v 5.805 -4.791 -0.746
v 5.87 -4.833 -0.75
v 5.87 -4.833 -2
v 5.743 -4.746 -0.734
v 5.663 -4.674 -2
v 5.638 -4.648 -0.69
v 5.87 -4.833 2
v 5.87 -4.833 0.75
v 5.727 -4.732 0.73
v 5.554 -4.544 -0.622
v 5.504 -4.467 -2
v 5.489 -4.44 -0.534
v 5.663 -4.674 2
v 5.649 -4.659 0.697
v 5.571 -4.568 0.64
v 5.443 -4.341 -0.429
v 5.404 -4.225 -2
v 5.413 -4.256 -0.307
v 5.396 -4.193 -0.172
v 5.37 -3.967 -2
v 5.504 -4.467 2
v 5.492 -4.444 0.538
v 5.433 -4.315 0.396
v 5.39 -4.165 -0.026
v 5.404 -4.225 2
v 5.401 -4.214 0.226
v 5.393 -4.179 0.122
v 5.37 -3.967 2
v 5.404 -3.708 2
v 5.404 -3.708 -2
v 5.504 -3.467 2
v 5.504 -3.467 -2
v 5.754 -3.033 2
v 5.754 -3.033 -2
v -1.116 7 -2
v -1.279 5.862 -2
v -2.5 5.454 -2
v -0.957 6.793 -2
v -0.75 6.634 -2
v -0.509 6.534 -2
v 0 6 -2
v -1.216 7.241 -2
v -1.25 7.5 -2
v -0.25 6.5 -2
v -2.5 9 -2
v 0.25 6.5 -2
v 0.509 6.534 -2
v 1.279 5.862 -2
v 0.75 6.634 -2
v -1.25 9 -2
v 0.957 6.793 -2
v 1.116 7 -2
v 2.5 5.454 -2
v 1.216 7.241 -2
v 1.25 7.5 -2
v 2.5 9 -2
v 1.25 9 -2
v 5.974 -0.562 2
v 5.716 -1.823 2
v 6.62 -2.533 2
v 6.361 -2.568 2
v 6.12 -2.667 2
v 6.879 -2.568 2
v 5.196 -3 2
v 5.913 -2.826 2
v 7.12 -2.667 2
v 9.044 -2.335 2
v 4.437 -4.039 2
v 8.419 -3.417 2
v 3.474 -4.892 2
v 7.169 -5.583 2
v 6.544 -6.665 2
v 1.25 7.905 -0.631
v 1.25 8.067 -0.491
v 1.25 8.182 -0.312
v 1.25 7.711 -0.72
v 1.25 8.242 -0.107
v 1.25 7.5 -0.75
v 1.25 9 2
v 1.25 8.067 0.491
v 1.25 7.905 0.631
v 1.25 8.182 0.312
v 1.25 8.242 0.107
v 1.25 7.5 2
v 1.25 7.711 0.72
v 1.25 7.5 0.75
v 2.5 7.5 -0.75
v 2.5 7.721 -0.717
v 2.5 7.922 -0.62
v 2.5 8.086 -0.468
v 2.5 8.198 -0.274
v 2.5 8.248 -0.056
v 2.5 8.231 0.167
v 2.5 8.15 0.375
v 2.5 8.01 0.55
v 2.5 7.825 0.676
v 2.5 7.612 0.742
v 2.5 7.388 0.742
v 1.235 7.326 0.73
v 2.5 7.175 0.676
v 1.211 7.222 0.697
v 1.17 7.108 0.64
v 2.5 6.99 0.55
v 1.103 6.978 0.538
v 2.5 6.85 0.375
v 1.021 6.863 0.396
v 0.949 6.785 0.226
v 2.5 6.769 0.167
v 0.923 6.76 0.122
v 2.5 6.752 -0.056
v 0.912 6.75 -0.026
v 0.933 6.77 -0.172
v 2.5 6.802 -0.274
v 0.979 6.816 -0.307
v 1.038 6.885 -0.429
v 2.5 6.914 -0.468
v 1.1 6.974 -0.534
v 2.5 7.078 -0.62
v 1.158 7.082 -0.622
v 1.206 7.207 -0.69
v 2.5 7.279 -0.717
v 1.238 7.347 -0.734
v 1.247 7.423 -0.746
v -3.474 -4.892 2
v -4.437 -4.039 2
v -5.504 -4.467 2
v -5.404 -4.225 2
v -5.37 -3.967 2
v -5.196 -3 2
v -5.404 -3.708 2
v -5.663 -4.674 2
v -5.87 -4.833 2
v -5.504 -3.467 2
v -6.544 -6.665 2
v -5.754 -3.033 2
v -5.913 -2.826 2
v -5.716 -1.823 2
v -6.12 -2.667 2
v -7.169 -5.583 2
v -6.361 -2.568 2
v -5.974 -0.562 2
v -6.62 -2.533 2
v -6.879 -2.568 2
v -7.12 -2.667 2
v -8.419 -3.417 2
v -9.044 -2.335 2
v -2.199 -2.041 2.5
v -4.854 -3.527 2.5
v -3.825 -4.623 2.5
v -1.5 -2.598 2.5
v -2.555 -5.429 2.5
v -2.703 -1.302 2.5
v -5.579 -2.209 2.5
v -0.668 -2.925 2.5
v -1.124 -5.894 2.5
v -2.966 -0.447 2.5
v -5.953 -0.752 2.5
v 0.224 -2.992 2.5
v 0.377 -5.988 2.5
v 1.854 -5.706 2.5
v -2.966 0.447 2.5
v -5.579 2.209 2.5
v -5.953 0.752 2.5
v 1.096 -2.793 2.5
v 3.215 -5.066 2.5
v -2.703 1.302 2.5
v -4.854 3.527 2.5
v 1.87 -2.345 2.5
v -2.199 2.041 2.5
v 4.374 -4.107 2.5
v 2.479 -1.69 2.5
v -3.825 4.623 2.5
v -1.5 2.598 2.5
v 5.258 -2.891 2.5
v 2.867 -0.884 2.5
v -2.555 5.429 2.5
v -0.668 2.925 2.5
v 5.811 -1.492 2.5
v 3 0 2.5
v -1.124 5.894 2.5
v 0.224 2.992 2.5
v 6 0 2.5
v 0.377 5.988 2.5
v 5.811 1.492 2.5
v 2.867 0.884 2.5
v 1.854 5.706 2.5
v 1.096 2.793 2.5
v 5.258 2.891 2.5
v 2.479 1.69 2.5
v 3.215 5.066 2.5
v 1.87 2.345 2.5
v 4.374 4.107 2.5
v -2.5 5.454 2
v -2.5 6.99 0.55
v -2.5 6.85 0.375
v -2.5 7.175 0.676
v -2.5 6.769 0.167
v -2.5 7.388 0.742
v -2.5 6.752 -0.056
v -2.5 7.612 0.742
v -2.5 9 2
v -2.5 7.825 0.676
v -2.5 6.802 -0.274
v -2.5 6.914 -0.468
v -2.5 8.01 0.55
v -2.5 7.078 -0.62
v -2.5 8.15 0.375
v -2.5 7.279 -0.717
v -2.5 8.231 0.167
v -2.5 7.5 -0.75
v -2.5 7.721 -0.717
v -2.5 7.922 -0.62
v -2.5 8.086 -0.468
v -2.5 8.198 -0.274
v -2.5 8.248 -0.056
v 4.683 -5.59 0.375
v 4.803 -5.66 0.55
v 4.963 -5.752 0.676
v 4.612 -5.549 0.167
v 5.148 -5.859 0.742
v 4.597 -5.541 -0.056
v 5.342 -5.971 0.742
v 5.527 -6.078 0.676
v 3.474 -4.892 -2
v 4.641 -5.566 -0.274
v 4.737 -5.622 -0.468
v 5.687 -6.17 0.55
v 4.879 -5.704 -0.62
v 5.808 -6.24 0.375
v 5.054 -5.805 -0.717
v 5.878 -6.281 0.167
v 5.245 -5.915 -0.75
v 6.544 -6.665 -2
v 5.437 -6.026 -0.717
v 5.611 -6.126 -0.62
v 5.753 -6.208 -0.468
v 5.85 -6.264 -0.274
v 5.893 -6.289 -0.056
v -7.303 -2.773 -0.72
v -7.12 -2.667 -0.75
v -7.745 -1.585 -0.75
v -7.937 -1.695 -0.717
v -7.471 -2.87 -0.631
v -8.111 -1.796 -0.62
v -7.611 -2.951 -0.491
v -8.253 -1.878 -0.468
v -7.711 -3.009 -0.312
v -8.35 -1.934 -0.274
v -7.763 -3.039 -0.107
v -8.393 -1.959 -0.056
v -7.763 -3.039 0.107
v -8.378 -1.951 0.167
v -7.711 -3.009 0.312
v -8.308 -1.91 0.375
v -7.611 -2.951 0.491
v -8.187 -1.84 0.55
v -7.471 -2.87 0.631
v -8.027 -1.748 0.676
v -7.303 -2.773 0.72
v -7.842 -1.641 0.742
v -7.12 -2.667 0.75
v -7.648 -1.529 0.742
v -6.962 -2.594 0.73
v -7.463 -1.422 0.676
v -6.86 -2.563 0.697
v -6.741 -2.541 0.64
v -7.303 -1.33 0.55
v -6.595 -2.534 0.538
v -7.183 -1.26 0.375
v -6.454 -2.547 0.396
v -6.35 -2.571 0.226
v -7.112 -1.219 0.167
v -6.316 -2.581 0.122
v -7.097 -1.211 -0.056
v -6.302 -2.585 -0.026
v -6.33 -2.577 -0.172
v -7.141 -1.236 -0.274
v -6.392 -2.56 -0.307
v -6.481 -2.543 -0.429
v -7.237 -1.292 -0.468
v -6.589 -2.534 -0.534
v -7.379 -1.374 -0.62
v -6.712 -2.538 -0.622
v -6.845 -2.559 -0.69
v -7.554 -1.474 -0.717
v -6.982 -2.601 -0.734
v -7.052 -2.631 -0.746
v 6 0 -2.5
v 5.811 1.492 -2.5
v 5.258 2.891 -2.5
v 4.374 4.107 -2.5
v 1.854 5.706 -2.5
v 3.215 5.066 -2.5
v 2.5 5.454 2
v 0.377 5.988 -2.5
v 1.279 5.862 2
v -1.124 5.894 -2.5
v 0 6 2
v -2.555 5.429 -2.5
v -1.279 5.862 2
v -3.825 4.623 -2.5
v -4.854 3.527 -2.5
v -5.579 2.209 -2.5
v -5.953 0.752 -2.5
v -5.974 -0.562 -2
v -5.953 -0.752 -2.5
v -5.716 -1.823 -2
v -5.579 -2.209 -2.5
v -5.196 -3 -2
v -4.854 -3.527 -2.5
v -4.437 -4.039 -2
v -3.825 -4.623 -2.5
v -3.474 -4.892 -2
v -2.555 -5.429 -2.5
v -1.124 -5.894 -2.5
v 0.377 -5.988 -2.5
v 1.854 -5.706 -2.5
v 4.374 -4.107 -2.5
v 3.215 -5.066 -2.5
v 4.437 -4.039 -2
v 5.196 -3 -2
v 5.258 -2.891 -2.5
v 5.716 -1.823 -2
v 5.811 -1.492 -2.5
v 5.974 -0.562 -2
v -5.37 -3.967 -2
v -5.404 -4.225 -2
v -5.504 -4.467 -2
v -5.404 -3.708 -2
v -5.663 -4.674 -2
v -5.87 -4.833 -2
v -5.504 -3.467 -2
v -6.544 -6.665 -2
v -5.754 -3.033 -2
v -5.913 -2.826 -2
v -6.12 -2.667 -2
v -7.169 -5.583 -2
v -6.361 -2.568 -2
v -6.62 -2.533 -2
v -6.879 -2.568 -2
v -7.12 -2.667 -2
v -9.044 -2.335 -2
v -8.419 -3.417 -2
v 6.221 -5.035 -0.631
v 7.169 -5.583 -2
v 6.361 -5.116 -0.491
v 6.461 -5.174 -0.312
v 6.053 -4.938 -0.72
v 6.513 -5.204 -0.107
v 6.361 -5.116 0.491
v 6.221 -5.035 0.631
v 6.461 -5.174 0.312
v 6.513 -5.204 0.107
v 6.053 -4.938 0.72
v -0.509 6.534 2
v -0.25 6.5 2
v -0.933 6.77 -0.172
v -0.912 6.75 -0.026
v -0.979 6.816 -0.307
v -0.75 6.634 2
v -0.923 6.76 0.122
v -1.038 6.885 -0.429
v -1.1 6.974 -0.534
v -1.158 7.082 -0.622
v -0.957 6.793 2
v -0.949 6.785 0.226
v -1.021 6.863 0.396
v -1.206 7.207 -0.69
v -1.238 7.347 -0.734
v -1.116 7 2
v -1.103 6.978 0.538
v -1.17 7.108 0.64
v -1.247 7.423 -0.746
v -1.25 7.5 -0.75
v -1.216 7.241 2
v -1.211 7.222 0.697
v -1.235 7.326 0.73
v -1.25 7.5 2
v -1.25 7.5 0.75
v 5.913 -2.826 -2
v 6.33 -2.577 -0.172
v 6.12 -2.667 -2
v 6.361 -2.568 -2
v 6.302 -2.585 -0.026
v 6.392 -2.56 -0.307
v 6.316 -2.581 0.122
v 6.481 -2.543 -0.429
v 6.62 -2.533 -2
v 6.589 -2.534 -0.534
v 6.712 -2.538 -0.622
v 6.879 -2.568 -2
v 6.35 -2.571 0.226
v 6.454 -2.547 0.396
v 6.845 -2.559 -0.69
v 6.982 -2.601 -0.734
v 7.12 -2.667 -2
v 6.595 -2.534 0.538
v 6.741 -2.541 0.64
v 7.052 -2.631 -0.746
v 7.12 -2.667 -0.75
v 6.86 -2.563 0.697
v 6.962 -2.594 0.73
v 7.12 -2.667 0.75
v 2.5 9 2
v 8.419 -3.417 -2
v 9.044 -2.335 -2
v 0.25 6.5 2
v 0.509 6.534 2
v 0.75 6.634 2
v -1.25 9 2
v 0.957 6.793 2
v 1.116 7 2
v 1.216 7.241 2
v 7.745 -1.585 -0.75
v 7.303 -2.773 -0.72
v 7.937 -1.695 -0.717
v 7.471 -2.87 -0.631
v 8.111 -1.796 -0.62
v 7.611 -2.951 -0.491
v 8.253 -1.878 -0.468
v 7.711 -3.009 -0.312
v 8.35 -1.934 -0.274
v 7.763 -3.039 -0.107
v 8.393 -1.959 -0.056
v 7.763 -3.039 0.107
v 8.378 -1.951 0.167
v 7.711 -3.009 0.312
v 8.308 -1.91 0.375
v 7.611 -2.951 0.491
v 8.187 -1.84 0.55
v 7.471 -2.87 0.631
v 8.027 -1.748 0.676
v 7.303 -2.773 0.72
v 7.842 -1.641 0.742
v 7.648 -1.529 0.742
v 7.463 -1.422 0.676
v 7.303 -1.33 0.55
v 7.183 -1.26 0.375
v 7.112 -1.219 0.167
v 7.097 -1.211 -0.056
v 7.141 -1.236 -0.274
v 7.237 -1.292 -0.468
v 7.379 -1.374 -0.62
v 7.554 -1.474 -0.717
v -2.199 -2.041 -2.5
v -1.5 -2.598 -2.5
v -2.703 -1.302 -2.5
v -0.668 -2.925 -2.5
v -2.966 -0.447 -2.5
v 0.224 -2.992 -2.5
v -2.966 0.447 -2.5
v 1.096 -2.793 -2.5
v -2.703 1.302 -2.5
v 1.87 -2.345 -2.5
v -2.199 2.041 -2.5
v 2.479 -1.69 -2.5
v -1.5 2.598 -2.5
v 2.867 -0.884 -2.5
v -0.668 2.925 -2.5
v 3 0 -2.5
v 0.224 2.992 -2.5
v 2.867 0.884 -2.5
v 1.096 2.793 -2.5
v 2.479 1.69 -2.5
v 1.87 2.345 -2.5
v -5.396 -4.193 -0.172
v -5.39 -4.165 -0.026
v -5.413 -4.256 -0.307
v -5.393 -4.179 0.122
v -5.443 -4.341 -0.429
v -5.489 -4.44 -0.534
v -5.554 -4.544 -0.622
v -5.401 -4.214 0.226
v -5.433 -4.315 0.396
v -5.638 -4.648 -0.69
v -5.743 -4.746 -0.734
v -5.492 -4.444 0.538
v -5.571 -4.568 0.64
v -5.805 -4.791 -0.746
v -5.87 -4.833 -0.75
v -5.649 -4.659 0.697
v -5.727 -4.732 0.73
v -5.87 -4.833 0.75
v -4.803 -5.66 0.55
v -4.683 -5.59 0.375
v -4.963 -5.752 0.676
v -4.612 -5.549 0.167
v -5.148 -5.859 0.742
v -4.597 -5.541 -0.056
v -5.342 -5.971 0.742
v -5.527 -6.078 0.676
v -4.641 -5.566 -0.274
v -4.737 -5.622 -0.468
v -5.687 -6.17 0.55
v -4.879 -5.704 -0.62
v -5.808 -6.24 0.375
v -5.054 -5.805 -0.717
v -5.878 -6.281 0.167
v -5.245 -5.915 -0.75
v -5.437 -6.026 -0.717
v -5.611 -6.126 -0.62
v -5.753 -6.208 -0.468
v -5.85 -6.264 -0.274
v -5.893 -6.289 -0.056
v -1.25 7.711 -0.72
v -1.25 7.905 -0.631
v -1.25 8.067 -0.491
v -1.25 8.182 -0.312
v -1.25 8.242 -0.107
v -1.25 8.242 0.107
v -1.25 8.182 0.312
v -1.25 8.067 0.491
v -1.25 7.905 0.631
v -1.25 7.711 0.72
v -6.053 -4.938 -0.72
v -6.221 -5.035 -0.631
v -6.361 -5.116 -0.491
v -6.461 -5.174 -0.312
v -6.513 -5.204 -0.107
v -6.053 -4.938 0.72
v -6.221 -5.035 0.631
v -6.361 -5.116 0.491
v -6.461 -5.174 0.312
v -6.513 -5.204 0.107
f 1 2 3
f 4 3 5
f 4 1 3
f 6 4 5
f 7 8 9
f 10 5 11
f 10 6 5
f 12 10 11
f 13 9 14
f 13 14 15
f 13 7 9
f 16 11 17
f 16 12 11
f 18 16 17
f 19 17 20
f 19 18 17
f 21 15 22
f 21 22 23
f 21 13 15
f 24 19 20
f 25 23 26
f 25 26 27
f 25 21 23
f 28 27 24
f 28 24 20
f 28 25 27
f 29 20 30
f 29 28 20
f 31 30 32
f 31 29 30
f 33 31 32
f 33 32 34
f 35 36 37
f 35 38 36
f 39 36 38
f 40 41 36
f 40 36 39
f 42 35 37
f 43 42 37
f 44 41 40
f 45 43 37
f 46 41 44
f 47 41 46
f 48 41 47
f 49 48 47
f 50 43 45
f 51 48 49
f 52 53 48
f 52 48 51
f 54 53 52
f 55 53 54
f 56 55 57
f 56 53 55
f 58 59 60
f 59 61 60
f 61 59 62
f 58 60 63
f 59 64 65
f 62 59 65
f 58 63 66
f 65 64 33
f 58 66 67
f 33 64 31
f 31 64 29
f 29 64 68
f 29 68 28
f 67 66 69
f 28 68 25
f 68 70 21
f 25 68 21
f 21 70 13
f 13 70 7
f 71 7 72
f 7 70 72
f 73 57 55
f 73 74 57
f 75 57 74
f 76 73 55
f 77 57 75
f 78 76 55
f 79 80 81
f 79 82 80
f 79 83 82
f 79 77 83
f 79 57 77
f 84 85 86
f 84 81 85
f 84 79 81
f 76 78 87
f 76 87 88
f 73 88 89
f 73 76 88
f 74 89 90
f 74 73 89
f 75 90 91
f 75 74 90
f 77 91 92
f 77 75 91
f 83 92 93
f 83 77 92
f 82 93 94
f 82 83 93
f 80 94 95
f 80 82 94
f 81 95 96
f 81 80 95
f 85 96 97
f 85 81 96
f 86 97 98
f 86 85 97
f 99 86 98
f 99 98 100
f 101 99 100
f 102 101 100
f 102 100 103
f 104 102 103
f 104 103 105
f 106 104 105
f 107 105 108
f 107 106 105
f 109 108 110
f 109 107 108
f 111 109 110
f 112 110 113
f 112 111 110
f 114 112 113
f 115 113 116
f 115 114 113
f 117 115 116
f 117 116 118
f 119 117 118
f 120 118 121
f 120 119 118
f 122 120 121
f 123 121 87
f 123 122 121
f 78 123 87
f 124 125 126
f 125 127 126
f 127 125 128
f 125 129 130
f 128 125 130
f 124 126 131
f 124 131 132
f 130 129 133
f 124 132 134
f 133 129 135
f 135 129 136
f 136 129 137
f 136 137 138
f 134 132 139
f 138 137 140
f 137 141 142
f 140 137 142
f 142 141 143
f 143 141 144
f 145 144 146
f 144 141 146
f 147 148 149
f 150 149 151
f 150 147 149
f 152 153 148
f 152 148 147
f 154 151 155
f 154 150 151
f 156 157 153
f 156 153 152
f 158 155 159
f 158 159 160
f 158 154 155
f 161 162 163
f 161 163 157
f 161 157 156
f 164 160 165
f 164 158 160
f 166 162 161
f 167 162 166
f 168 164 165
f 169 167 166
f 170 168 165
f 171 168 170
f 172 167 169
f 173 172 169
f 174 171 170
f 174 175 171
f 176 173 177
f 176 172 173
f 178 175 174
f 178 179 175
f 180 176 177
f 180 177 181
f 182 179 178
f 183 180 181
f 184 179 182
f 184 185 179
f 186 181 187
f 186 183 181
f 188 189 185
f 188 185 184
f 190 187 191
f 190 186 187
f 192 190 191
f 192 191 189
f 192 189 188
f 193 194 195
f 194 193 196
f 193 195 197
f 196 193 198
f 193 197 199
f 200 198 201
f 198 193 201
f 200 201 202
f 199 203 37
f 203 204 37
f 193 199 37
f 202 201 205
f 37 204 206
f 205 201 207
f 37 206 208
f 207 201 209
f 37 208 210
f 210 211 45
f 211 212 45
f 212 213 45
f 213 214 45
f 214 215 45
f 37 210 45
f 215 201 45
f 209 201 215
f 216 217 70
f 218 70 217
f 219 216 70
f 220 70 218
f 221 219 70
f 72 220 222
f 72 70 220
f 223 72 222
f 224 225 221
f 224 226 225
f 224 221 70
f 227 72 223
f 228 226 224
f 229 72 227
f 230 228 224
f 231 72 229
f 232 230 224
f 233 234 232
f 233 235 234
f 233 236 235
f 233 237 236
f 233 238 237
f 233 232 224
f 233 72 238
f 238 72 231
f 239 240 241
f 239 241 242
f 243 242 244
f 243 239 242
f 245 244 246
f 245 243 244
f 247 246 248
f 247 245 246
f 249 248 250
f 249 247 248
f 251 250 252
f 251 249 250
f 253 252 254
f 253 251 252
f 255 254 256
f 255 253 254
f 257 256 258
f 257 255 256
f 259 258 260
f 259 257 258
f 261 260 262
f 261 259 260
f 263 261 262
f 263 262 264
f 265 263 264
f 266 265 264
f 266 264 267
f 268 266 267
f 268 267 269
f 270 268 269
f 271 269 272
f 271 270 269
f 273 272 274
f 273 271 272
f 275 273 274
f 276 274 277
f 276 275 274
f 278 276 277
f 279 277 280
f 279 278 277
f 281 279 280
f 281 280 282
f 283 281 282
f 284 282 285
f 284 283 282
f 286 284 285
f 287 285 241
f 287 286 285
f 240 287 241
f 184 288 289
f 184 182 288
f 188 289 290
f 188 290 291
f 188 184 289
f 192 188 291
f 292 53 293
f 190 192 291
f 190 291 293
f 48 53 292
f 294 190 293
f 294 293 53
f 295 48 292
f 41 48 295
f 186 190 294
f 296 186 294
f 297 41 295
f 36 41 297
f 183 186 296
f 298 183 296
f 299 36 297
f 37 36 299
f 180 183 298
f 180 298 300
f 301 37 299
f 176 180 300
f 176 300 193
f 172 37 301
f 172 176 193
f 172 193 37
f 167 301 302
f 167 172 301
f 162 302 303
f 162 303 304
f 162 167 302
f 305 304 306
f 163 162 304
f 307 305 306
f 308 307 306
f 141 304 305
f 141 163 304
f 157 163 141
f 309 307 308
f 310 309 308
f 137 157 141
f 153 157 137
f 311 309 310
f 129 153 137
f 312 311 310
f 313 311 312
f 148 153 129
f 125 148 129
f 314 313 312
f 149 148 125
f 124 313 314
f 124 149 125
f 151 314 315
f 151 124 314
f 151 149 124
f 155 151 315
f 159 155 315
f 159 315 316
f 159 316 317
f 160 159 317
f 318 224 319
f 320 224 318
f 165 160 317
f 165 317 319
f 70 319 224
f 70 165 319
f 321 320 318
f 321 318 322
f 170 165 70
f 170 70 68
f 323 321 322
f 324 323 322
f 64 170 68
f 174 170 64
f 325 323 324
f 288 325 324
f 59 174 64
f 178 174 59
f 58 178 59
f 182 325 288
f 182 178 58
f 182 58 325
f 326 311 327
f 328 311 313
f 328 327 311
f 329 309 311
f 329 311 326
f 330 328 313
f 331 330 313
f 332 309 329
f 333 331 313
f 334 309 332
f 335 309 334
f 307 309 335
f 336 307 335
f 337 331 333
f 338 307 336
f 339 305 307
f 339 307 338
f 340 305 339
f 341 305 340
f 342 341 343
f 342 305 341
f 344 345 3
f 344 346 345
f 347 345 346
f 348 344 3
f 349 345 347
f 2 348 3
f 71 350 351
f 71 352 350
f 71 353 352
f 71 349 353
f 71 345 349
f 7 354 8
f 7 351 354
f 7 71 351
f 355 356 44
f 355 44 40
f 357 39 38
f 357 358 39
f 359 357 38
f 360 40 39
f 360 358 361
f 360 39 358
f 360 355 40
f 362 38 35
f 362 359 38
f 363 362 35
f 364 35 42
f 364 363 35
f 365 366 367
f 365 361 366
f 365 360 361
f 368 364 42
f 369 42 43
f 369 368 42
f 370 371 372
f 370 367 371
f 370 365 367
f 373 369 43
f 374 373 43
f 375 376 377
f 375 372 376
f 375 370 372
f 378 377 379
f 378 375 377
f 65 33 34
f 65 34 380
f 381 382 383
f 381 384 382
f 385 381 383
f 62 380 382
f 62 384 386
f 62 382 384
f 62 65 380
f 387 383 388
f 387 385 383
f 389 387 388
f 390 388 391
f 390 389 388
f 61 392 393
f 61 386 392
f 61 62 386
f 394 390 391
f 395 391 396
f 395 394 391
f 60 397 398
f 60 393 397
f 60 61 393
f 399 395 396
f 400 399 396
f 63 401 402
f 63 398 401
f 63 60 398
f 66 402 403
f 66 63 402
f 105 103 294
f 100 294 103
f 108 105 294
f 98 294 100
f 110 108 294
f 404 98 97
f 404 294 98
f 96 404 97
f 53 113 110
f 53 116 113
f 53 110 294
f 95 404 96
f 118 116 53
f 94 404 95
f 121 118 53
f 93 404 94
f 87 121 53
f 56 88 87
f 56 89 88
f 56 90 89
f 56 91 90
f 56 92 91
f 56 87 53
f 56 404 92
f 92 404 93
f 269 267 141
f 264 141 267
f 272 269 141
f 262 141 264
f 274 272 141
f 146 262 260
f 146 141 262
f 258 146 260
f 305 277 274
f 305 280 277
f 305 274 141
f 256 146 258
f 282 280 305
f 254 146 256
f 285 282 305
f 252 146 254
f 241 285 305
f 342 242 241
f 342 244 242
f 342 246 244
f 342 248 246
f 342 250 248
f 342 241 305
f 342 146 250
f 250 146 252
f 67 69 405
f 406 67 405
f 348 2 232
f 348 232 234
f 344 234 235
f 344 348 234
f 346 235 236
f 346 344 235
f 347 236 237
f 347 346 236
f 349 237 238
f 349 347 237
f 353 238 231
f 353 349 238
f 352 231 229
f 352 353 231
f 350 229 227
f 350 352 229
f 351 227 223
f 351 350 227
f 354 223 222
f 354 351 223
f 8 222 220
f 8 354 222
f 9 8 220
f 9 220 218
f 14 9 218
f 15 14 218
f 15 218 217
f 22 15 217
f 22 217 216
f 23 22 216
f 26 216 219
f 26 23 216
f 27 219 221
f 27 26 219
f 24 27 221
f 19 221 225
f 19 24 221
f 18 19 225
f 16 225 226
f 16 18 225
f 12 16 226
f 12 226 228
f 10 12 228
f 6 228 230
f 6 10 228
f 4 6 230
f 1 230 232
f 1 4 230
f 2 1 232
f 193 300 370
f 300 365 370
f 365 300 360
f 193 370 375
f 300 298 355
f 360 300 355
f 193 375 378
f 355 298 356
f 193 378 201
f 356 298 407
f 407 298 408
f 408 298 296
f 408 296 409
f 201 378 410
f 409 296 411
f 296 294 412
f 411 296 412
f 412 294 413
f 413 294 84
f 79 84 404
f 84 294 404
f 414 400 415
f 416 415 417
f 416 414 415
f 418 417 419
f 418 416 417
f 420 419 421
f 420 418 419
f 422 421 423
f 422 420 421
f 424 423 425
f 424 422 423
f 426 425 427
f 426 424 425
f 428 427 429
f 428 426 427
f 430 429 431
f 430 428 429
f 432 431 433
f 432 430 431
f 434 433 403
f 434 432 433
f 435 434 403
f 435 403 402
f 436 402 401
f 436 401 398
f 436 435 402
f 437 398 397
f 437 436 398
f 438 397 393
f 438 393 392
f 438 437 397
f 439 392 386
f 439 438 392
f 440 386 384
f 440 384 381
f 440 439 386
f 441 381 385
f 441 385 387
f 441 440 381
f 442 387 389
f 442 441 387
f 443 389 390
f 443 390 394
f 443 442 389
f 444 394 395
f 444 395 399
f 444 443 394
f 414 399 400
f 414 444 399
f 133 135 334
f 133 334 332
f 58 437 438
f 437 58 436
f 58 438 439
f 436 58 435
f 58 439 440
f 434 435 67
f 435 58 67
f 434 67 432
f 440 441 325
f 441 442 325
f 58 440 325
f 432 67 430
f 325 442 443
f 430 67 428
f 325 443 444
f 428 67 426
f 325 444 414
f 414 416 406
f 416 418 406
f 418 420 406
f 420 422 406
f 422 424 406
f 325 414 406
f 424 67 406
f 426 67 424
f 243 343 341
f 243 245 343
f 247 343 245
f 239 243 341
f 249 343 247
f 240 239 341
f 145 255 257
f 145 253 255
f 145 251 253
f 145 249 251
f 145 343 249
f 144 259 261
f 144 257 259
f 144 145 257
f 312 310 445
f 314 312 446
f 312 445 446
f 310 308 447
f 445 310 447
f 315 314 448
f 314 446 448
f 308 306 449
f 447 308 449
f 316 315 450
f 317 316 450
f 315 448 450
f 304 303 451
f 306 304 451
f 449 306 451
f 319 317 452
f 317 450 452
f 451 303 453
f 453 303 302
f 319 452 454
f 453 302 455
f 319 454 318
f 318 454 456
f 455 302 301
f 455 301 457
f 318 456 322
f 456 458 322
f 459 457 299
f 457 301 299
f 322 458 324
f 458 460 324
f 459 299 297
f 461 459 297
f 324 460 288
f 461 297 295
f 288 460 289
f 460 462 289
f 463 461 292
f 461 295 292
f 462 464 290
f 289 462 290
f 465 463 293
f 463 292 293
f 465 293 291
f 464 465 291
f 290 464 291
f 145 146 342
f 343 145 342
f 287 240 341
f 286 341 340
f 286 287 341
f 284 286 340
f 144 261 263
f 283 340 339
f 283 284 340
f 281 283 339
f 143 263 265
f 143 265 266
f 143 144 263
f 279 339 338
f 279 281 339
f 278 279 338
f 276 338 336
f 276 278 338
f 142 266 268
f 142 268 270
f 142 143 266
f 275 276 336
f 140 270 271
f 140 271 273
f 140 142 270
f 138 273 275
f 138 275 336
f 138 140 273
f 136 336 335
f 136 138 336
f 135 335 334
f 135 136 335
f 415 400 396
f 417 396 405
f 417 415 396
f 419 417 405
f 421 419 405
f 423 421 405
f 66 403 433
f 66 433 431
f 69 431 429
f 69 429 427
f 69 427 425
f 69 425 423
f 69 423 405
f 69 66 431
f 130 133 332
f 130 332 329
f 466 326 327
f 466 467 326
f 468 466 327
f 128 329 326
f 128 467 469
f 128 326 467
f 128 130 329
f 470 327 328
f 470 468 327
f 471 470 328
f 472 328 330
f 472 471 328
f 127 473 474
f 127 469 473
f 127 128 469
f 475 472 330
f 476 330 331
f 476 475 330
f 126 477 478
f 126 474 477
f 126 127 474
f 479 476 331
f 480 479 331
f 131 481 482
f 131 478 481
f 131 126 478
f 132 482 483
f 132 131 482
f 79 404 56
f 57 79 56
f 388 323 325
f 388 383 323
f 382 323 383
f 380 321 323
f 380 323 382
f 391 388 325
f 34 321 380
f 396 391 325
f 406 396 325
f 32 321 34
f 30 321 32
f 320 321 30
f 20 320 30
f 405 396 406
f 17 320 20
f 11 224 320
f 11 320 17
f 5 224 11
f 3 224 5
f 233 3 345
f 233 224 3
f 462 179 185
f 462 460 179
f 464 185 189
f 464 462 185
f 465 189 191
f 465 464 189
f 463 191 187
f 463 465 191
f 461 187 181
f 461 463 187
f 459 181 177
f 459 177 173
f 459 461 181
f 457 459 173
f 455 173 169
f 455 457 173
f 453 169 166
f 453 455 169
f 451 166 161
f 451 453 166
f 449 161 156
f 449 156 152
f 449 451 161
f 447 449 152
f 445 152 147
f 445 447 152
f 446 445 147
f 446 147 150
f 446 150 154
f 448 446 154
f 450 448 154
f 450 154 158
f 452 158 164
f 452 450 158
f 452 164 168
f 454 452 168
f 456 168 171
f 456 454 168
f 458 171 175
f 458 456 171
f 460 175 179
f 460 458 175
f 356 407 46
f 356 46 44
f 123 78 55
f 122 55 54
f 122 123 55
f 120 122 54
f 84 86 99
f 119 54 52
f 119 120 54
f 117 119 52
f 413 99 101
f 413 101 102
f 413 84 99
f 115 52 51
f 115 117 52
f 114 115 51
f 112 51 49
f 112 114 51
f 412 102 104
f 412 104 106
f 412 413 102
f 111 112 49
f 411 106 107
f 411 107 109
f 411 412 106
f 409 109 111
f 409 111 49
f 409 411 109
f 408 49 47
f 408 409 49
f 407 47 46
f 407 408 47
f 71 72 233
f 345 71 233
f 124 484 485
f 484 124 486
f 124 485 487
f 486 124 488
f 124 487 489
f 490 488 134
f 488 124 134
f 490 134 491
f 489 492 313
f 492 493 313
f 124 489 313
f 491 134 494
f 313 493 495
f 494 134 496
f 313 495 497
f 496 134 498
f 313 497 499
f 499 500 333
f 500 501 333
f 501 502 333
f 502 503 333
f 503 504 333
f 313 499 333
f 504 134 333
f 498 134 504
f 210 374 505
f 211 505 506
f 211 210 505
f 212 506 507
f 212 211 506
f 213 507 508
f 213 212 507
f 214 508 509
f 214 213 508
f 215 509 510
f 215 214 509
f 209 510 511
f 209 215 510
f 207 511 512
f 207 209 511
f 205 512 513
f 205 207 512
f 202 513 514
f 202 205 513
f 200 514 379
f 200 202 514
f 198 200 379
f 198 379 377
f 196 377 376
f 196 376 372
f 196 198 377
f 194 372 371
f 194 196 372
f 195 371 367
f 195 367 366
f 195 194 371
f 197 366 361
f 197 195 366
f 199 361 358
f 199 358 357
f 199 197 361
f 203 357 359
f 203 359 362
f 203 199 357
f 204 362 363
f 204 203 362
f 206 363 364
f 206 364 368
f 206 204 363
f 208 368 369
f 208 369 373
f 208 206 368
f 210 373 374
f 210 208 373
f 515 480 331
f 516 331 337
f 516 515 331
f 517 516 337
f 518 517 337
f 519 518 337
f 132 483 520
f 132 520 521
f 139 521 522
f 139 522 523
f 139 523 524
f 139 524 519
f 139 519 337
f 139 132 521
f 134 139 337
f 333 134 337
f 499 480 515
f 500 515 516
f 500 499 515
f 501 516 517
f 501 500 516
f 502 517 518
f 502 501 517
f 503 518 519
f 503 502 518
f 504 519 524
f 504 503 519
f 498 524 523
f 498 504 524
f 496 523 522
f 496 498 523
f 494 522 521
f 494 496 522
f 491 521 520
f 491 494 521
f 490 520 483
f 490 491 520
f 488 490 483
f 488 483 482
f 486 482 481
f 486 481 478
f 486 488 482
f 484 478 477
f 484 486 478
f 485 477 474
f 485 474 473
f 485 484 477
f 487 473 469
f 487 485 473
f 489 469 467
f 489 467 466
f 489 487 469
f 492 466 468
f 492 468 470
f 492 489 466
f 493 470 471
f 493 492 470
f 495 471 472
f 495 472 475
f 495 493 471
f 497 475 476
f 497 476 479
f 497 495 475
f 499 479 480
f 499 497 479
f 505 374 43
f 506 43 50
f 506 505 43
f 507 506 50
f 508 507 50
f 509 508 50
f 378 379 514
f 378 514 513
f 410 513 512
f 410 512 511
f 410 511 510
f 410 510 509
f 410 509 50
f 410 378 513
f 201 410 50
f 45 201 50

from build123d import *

# Parameters (mm, degrees)
CROQUIS1_R              = 6
CROQUIS1_R_2            = 3
SALIENTE_EXTRUIR1_DEPTH = 2.5
CROQUIS3_W              = 4
CROQUIS3_H              = 4
CROQUIS3_R              = 0.75
SALIENTE_EXTRUIR2_DEPTH = 2.5
CORTAR_EXTRUIR1_DEPTH   = 5
MATRIZC1_COUNT          = 3


with BuildPart() as part:
    # Croquis1 → Saliente-Extruir1 (new, symmetric)
    with BuildSketch(Plane.XY):
        Circle(CROQUIS1_R)
        Circle(CROQUIS1_R_2, mode=Mode.SUBTRACT)
    extrude(amount=SALIENTE_EXTRUIR1_DEPTH, both=True)

    # Croquis3 → Saliente-Extruir2 (add, symmetric)
    with BuildSketch(Plane(origin=(0, 0, 0), x_dir=(0, 0, -1), z_dir=(1, 0, 0))):
        with Locations((0, 7)):
            Rectangle(CROQUIS3_W, CROQUIS3_H)
        with Locations((0, 7.5)):
            Circle(CROQUIS3_R, mode=Mode.SUBTRACT)
    saliente_extruir2 = extrude(amount=SALIENTE_EXTRUIR2_DEPTH, both=True)

    # Croquis4 → Cortar-Extruir1 (cut)
    with BuildSketch(Plane.XY.offset(2)):
        with BuildLine():
            Line((-1.25, 9), (1.25, 9))
            Line((1.25, 9), (1.25, 7.5))
            ThreePointArc((1.25, 7.5), (0.957106781, 6.792893219), (0.25, 6.5))
            Line((0.25, 6.5), (-0.25, 6.5))
            ThreePointArc((-0.25, 6.5), (-0.957106781, 6.792893219), (-1.25, 7.5))
            Line((-1.25, 7.5), (-1.25, 9))
        make_face()
    cortar_extruir1 = extrude(amount=-CORTAR_EXTRUIR1_DEPTH, mode=Mode.SUBTRACT)

    # MatrizC1: Saliente-Extruir2, Cortar-Extruir1 ×3 about axis
    matrizc1_axis = Axis((0, 0, 0), (0, 0, 1))
    add([saliente_extruir2.rotate(matrizc1_axis, i * 360 / MATRIZC1_COUNT) for i in range(1, MATRIZC1_COUNT)])
    add([cortar_extruir1.rotate(matrizc1_axis, i * 360 / MATRIZC1_COUNT) for i in range(1, MATRIZC1_COUNT)], mode=Mode.SUBTRACT)


solid = part.part
